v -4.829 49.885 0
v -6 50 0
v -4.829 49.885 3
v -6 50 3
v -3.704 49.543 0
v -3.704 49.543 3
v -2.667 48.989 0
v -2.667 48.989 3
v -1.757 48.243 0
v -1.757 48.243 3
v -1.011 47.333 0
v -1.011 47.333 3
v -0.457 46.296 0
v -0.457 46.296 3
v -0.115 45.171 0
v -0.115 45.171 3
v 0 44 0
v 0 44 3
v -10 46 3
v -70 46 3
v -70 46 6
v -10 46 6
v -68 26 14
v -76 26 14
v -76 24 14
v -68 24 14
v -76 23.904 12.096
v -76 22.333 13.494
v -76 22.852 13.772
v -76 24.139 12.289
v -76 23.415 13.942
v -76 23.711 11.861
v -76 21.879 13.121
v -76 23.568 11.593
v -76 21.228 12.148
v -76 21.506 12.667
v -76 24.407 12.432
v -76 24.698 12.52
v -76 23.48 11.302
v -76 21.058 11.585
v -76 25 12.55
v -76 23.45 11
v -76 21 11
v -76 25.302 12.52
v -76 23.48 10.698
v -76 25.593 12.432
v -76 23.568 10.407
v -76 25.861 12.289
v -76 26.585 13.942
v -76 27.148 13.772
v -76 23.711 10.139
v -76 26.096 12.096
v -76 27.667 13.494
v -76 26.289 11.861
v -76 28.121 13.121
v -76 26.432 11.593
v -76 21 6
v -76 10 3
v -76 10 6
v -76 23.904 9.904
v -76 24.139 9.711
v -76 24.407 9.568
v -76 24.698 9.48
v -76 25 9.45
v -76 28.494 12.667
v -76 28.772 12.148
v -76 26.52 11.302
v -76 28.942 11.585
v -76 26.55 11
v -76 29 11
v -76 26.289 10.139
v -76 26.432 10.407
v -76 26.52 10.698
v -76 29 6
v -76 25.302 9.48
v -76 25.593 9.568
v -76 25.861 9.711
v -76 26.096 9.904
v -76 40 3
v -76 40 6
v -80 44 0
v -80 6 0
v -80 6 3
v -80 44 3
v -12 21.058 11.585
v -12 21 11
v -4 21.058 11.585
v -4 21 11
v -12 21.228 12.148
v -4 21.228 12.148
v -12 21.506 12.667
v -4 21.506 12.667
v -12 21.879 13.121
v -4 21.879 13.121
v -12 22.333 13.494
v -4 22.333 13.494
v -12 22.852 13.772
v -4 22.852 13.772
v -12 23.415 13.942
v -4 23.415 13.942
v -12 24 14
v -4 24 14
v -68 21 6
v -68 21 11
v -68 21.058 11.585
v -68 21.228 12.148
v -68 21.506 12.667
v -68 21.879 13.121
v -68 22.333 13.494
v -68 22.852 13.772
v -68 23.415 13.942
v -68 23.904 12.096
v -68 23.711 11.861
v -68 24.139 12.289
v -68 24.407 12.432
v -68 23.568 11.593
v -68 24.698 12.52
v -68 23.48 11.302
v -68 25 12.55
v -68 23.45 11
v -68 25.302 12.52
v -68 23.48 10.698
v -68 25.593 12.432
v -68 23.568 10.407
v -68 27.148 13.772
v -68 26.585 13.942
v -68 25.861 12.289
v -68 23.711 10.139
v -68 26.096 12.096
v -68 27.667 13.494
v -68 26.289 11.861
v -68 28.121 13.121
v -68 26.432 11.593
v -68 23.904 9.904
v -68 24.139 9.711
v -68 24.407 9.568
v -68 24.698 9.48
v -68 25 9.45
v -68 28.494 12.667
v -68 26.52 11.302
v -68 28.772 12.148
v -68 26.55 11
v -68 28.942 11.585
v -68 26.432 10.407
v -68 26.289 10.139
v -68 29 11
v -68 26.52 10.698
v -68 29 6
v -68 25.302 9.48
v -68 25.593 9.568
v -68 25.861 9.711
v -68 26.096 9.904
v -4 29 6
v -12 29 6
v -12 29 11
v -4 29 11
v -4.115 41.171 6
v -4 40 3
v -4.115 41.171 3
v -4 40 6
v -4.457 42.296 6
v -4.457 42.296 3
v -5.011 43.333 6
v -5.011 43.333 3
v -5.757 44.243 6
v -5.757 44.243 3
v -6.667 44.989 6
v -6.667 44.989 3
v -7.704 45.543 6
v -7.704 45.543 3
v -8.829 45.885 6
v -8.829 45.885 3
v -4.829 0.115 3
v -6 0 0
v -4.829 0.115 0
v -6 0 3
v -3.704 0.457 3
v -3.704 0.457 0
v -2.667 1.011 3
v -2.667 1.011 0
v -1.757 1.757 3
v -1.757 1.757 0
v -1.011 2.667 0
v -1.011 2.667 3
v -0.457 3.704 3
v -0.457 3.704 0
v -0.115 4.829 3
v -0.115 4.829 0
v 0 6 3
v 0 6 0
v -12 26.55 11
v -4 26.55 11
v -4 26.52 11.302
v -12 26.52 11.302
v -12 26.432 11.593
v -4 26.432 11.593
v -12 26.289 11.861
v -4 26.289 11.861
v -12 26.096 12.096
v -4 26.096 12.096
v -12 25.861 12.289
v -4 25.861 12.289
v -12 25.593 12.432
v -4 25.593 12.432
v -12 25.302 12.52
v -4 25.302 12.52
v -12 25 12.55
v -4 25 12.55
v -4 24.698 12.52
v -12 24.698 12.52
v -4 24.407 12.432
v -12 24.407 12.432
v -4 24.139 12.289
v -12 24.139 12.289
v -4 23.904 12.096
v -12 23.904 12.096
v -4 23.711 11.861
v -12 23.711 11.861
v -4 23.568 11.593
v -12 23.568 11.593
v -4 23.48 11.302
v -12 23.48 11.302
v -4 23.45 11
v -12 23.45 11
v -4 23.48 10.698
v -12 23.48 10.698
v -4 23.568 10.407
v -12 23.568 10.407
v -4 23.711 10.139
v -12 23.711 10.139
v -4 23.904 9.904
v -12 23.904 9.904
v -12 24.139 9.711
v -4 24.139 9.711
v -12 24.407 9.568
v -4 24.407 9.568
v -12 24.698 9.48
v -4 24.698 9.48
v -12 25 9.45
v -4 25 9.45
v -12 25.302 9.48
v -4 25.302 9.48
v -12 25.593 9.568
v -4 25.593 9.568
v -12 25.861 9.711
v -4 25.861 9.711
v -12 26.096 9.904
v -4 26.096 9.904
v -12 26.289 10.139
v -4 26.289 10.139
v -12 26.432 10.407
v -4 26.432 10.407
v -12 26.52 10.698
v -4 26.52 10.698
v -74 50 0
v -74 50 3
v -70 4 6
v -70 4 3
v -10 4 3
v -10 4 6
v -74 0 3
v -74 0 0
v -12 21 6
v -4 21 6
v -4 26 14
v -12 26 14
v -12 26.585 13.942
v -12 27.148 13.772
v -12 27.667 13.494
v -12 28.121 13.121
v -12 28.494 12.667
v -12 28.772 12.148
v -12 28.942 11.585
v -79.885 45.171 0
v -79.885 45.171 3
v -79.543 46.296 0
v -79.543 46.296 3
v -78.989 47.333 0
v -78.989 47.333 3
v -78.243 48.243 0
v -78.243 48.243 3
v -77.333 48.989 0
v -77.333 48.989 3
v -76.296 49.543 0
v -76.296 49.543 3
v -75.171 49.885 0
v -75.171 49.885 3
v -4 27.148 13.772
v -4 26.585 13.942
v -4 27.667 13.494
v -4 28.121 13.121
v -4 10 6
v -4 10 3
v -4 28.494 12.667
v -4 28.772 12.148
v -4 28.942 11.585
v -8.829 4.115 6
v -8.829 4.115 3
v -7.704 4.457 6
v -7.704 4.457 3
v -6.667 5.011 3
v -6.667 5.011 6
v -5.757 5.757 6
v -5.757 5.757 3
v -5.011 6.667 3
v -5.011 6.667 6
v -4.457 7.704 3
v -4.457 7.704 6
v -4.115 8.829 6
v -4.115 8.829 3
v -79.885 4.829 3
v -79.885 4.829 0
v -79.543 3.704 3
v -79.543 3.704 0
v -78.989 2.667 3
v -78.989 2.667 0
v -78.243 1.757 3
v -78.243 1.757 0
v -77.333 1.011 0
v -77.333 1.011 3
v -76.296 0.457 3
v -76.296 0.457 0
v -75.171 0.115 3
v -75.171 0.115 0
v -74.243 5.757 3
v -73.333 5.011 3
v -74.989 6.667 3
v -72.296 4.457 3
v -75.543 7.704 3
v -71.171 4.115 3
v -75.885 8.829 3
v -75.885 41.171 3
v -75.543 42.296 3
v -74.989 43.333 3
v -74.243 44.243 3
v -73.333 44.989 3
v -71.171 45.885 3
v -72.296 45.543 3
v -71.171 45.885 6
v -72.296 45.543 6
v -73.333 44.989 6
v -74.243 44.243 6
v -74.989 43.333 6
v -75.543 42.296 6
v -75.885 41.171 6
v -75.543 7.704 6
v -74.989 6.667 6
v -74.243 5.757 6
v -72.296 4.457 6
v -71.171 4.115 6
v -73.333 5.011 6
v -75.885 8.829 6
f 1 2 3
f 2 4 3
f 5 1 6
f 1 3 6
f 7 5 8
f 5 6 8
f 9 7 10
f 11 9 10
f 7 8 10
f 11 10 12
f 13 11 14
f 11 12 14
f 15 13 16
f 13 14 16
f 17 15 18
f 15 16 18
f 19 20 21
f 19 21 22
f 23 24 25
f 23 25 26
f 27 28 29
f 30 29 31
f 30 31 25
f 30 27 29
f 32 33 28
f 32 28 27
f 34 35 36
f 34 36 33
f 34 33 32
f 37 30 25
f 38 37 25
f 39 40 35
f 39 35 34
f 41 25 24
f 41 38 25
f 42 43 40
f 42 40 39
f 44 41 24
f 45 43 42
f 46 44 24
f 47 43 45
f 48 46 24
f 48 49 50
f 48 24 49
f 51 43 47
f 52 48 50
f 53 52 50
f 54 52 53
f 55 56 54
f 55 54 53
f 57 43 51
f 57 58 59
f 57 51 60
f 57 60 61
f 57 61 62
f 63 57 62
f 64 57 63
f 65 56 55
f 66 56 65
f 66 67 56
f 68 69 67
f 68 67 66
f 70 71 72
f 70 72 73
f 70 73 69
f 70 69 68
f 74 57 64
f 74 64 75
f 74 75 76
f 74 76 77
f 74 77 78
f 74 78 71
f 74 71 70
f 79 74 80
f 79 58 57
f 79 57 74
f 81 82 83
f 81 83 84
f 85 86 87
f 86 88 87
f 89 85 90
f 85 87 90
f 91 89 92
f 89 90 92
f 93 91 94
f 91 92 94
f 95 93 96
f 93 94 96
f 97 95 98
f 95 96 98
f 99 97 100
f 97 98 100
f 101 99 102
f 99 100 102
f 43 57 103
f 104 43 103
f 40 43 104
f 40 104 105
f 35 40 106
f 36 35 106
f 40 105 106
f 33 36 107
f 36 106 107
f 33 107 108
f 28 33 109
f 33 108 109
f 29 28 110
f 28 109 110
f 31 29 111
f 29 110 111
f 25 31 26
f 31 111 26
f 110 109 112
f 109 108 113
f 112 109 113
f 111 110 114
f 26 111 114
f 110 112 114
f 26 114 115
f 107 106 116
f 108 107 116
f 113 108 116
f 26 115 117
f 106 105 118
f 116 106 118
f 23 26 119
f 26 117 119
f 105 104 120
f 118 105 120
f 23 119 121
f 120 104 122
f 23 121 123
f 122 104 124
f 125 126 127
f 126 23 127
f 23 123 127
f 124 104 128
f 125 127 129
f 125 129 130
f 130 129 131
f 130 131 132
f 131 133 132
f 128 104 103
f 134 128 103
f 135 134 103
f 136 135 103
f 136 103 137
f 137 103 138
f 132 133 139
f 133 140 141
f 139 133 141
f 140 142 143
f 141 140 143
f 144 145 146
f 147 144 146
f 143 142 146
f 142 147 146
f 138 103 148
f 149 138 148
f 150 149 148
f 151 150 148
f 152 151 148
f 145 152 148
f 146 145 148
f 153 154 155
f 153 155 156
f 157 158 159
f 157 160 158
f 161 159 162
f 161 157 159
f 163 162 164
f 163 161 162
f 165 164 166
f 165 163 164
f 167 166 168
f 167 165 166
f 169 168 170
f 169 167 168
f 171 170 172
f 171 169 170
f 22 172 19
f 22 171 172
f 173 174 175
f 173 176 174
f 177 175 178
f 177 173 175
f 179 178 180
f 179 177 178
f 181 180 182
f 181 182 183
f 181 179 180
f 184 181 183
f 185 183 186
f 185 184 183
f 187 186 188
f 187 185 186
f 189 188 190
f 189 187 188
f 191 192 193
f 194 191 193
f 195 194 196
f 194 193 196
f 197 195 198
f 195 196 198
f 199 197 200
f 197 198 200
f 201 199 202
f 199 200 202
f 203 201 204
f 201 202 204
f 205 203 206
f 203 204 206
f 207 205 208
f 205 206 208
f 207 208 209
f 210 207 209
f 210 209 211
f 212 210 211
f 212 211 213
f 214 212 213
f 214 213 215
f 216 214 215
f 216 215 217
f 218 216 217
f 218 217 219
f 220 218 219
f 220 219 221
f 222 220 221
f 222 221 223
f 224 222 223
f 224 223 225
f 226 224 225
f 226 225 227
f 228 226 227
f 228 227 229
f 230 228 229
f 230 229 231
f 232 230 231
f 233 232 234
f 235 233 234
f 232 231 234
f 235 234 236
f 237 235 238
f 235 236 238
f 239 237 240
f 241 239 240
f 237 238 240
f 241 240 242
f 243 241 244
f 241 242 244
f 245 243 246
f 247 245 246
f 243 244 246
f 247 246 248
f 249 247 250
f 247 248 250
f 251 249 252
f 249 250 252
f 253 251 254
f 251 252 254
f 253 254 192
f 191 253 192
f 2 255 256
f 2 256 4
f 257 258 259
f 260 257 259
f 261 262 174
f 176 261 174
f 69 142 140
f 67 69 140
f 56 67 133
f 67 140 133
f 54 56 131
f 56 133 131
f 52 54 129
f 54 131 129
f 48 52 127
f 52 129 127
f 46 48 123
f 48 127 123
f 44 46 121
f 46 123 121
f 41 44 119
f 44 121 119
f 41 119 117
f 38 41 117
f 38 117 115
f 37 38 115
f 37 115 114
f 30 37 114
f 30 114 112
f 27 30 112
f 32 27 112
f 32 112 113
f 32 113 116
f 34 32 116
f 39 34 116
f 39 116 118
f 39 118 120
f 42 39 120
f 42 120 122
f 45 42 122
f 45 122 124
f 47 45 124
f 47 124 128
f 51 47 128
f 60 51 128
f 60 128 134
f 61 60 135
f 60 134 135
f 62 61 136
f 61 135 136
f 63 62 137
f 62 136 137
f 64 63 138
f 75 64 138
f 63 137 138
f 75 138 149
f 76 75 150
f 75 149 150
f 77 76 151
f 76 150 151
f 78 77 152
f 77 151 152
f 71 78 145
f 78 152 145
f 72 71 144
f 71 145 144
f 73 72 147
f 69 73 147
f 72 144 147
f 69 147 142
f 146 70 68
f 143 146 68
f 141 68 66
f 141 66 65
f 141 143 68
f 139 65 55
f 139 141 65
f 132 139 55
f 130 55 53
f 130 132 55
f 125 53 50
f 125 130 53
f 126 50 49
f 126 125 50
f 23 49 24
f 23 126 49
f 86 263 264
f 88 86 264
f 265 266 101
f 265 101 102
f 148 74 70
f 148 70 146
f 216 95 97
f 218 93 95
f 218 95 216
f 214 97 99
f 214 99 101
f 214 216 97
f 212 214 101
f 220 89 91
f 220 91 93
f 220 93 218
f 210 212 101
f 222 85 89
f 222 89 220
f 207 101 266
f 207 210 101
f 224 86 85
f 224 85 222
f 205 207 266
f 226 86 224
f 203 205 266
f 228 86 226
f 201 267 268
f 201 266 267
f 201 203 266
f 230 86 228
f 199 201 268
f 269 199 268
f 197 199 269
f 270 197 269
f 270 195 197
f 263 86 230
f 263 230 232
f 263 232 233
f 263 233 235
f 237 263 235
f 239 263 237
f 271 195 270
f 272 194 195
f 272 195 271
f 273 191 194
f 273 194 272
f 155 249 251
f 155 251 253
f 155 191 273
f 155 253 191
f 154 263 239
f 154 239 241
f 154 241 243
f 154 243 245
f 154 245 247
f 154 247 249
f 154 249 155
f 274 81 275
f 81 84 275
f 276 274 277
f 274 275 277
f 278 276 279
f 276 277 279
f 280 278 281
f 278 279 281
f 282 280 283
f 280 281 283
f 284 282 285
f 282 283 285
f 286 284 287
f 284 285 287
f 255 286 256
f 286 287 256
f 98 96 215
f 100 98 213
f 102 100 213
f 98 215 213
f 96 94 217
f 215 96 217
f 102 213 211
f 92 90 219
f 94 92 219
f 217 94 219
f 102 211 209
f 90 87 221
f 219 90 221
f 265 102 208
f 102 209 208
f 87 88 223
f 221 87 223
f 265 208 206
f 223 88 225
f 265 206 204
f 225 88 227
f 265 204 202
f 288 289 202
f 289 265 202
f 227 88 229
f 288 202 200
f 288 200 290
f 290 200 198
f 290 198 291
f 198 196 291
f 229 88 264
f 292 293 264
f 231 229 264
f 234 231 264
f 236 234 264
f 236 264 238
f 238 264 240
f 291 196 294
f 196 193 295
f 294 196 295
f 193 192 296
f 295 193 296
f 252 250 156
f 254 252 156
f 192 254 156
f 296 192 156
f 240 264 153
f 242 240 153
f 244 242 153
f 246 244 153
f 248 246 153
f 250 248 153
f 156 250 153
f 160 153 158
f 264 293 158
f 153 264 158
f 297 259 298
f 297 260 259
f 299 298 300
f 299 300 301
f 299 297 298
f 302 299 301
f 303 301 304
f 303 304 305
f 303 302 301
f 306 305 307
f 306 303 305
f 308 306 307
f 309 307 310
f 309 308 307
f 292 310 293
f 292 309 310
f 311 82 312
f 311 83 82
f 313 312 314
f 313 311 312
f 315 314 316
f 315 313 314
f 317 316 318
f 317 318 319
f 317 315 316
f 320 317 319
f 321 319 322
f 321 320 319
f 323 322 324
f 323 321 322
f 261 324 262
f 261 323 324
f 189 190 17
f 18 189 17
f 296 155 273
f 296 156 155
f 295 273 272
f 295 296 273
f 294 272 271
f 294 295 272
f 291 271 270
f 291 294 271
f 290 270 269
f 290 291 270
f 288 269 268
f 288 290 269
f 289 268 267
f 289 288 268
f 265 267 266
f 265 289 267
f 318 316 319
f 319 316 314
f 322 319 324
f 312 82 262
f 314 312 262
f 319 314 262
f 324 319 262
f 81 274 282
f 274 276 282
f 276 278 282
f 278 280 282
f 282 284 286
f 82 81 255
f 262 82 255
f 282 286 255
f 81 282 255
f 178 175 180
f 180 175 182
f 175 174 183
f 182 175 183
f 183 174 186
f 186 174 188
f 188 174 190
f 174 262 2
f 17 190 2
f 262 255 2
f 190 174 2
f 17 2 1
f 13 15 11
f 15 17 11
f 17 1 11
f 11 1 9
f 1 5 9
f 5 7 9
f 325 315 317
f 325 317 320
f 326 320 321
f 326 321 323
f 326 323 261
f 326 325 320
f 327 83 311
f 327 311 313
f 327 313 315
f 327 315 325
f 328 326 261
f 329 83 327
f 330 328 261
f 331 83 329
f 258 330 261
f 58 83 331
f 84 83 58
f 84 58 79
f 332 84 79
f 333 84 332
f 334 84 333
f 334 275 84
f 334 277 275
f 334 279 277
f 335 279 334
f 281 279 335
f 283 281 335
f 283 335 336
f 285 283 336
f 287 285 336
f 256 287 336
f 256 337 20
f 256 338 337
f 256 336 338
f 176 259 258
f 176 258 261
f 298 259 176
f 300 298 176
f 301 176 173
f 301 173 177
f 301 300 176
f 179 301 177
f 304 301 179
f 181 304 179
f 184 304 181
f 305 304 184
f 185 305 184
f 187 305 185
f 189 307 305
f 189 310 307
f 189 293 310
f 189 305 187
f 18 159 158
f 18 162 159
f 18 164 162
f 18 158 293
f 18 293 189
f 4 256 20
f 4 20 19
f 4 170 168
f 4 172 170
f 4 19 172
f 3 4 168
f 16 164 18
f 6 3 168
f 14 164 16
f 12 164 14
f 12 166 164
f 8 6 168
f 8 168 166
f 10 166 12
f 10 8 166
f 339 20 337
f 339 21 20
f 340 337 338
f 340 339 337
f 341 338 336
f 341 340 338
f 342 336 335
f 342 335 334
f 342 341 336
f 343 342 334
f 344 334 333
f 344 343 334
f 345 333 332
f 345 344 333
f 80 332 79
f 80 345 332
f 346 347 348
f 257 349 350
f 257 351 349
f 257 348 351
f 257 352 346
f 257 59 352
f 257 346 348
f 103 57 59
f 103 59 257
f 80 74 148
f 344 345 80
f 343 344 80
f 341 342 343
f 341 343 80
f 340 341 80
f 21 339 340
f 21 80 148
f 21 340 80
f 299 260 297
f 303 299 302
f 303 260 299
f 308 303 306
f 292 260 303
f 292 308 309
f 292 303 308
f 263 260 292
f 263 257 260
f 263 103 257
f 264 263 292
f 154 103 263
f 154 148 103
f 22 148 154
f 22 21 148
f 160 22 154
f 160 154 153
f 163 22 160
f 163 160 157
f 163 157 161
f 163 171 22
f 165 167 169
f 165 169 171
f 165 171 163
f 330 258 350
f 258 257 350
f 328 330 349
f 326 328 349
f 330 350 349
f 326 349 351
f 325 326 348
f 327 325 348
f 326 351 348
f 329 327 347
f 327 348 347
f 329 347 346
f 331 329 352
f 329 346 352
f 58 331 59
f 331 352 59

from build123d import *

# Parameters (mm, degrees)
SKETCH_W     = 80
SKETCH_H     = 50
PAD_DEPTH    = 3
SKETCH001_W  = 72
SKETCH001_H  = 42
PAD001_DEPTH = 3
FILLET_R     = 6
SKETCH002_W  = 8
SKETCH002_H  = 8
PAD002_DEPTH = 8
FILLET001_R  = 3
SKETCH003_R  = 1.55
POCKET_DEPTH = 76.001


with BuildPart() as part:
    # Sketch → Pad (new body)
    with BuildSketch(Plane.XY):
        with Locations((-40, 25)):
            Rectangle(SKETCH_W, SKETCH_H)
    extrude(amount=PAD_DEPTH)

    # Sketch001 (on Face6 of Pad) → Pad001 (join)
    with BuildSketch(Plane.XY.offset(3)):
        with Locations((-40, 25)):
            Rectangle(SKETCH001_W, SKETCH001_H)
    extrude(amount=PAD001_DEPTH)

    # Fillet
    fillet_edges = [part.edges().sort_by_distance(p)[0] for p in [
        (-80, 0, 1.5),
        (-76, 4, 4.5),
        (-4, 4, 4.5),
        (0, 0, 1.5),
        (0, 50, 1.5),
        (-4, 46, 4.5),
        (-76, 46, 4.5),
        (-80, 50, 1.5),
    ]]
    fillet(fillet_edges, radius=FILLET_R)

    # Sketch002 (on Face19 of Fillet) → Pad002 (join)
    with BuildSketch(Plane.XY.offset(6)):
        with Locations((-72, 25)):
            Rectangle(SKETCH002_W, SKETCH002_H)
        with Locations((-8, 25)):
            Rectangle(SKETCH002_W, SKETCH002_H)
    extrude(amount=PAD002_DEPTH)

    # Fillet001
    fillet001_edges = [part.edges().sort_by_distance(p)[0] for p in [
        (-8, 21, 14),
        (-8, 29, 14),
        (-72, 21, 14),
        (-72, 29, 14),
    ]]
    fillet(fillet001_edges, radius=FILLET001_R)

    # Sketch003 (on Face29 of Fillet001) → Pocket (cut, through all)
    with BuildSketch(Plane.YZ.offset(-4)):
        with Locations((25, 11)):
            Circle(SKETCH003_R)
    extrude(amount=-POCKET_DEPTH, mode=Mode.SUBTRACT)


solid = part.part
